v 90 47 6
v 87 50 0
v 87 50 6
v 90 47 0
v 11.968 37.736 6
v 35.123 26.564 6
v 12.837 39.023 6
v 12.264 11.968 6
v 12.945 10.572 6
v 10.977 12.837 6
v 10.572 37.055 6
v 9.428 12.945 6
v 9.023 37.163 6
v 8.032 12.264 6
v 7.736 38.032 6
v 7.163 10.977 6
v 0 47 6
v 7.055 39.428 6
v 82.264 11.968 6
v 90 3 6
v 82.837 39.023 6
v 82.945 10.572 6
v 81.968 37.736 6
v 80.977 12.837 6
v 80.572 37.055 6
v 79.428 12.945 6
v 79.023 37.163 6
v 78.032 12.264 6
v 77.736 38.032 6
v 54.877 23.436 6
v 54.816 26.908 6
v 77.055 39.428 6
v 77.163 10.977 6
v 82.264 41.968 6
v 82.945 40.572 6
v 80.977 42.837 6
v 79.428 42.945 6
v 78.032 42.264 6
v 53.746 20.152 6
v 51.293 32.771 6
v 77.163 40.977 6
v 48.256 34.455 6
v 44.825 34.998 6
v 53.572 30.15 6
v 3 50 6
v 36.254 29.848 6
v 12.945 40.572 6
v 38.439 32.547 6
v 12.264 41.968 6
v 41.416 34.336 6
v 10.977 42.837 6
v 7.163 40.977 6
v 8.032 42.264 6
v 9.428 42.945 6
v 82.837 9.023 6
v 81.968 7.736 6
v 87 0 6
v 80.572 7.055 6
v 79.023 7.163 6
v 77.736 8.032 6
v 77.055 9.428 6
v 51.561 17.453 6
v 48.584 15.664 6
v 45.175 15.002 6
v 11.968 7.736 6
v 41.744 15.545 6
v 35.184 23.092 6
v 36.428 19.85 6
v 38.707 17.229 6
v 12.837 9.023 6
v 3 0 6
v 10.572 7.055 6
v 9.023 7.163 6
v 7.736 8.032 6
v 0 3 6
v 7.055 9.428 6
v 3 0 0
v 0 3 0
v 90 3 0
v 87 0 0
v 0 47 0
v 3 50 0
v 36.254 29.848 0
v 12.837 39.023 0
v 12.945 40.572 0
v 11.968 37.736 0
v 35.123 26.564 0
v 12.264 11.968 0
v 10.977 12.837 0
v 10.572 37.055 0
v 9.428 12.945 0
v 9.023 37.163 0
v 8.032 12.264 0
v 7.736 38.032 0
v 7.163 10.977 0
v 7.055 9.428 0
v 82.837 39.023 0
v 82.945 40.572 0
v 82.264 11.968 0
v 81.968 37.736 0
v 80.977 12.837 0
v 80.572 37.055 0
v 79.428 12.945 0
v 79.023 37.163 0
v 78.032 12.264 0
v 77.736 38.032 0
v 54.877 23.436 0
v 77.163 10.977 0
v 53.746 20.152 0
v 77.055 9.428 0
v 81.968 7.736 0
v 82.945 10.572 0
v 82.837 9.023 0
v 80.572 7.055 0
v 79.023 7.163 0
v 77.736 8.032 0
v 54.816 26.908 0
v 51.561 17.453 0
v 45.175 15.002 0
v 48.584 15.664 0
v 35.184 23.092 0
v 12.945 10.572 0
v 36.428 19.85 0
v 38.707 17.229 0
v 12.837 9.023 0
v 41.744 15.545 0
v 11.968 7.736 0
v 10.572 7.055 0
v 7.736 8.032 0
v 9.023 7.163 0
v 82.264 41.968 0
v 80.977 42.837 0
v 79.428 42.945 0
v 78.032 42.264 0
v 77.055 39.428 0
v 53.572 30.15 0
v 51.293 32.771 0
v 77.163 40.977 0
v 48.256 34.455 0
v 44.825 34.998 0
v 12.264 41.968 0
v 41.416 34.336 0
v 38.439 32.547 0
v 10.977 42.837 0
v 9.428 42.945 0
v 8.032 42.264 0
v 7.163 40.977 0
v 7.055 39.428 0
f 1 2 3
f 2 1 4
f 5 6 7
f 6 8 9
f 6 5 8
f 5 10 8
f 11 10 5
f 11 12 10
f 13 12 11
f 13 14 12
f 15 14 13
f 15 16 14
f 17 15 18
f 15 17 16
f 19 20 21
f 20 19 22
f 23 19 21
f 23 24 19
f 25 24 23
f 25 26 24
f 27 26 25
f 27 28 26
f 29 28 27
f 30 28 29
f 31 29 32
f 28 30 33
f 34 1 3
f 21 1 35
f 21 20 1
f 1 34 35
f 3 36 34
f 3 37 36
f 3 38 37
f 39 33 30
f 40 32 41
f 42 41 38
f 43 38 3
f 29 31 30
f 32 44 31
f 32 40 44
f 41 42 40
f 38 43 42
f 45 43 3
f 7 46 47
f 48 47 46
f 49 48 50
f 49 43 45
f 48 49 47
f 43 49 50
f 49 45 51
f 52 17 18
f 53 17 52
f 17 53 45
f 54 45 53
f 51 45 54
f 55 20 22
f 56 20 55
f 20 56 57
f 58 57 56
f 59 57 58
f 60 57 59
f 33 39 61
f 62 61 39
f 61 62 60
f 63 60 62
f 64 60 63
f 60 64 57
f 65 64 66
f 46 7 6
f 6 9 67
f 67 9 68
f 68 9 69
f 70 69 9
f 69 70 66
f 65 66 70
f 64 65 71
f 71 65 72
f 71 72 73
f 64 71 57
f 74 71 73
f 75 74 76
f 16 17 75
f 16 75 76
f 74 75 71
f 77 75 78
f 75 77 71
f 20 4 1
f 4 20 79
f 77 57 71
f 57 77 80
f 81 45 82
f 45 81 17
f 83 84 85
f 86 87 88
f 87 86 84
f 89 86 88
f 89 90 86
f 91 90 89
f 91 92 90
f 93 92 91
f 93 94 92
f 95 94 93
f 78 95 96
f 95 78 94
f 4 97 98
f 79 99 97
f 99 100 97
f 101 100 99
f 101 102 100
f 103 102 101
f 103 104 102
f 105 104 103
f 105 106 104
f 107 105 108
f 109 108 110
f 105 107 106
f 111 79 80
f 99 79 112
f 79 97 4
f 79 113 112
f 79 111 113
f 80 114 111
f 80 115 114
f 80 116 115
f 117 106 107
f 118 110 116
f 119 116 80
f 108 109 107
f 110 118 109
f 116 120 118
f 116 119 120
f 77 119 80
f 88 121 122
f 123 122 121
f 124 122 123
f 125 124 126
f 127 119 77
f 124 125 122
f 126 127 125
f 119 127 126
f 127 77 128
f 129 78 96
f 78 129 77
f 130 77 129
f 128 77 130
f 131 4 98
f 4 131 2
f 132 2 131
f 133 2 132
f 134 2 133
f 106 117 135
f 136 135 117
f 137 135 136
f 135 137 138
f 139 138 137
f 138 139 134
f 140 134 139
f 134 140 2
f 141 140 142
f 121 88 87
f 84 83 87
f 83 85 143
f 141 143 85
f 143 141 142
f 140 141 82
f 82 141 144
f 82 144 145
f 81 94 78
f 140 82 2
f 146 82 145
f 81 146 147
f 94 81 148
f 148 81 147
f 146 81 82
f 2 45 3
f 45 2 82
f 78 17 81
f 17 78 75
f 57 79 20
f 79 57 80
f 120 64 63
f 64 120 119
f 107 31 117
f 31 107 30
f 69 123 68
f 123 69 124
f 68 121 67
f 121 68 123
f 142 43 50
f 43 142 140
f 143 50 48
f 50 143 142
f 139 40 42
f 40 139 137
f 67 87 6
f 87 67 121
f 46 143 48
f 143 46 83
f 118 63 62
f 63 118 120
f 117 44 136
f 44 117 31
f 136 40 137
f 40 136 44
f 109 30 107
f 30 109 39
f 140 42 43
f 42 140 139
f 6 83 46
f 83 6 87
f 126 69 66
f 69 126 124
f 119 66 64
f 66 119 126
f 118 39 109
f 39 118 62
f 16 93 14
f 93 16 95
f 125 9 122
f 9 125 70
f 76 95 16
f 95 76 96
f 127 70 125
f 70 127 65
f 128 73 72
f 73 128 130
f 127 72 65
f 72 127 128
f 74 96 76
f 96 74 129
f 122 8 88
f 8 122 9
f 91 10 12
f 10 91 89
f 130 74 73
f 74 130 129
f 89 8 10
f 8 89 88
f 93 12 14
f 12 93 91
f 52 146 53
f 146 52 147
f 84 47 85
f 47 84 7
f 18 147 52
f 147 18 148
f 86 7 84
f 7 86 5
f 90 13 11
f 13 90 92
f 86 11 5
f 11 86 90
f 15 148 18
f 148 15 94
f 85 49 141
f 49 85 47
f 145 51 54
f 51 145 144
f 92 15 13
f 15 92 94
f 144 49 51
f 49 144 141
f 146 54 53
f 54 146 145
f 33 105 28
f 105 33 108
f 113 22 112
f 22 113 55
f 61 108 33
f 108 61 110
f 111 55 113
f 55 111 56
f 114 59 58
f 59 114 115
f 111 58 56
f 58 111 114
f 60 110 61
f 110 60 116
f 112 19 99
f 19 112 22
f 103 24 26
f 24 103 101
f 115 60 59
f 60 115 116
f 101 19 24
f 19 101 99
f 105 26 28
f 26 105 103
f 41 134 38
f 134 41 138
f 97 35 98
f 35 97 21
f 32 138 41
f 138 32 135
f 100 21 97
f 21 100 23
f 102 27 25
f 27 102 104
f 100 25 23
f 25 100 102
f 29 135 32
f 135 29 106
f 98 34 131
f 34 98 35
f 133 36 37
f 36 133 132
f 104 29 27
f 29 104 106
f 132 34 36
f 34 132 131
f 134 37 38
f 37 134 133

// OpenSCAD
$fn = 32;

// ----------------------------------------------------------------------
// Spacer plate: rect 90 x 50
// ----------------------------------------------------------------------

// --- parameters (mm) ---
bore_r = 10;              // centre bore radius
bolt_r = 3;               // bolt hole radius
plate_t = 6;              // plate thickness, Z (extrusion height)
plate_l = 90;             // plate length, X
plate_w = 50;             // plate width, Y
inset = 10;               // corner hole inset

profile = [[3, 0], [87, 0], [90, 3], [90, 47], [87, 50], [3, 50], [0, 47], [0, 3]];  // primary outline, 8 points, counter clockwise
void_1 = [[54.816, 26.908], [53.572, 30.15], [51.293, 32.771], [48.256, 34.455], [44.825, 34.998], [41.416, 34.336], [38.439, 32.547], [36.254, 29.848], [35.123, 26.564], [35.184, 23.092], [36.428, 19.85], [38.707, 17.229], [41.744, 15.545], [45.175, 15.002], [48.584, 15.664], [51.561, 17.453], [53.746, 20.152], [54.877, 23.436]];  // centre bore, 18 points
void_2 = [[12.945, 10.572], [12.264, 11.968], [10.977, 12.837], [9.428, 12.945], [8.032, 12.264], [7.163, 10.977], [7.055, 9.428], [7.736, 8.032], [9.023, 7.163], [10.572, 7.055], [11.968, 7.736], [12.837, 9.023]];  // corner hole, 12 points
void_3 = [[12.945, 40.572], [12.264, 41.968], [10.977, 42.837], [9.428, 42.945], [8.032, 42.264], [7.163, 40.977], [7.055, 39.428], [7.736, 38.032], [9.023, 37.163], [10.572, 37.055], [11.968, 37.736], [12.837, 39.023]];  // corner hole, 12 points
void_4 = [[82.945, 10.572], [82.264, 11.968], [80.977, 12.837], [79.428, 12.945], [78.032, 12.264], [77.163, 10.977], [77.055, 9.428], [77.736, 8.032], [79.023, 7.163], [80.572, 7.055], [81.968, 7.736], [82.837, 9.023]];  // corner hole, 12 points
void_5 = [[82.945, 40.572], [82.264, 41.968], [80.977, 42.837], [79.428, 42.945], [78.032, 42.264], [77.163, 40.977], [77.055, 39.428], [77.736, 38.032], [79.023, 37.163], [80.572, 37.055], [81.968, 37.736], [82.837, 39.023]];  // corner hole, 12 points

// --- the one profile operation ---
difference() {
  linear_extrude(height = plate_t) polygon(points = profile);
  translate([0, 0, -1])
    linear_extrude(height = plate_t + 2) polygon(points = void_1);
  translate([0, 0, -1])
    linear_extrude(height = plate_t + 2) polygon(points = void_2);
  translate([0, 0, -1])
    linear_extrude(height = plate_t + 2) polygon(points = void_3);
  translate([0, 0, -1])
    linear_extrude(height = plate_t + 2) polygon(points = void_4);
  translate([0, 0, -1])
    linear_extrude(height = plate_t + 2) polygon(points = void_5);
}
